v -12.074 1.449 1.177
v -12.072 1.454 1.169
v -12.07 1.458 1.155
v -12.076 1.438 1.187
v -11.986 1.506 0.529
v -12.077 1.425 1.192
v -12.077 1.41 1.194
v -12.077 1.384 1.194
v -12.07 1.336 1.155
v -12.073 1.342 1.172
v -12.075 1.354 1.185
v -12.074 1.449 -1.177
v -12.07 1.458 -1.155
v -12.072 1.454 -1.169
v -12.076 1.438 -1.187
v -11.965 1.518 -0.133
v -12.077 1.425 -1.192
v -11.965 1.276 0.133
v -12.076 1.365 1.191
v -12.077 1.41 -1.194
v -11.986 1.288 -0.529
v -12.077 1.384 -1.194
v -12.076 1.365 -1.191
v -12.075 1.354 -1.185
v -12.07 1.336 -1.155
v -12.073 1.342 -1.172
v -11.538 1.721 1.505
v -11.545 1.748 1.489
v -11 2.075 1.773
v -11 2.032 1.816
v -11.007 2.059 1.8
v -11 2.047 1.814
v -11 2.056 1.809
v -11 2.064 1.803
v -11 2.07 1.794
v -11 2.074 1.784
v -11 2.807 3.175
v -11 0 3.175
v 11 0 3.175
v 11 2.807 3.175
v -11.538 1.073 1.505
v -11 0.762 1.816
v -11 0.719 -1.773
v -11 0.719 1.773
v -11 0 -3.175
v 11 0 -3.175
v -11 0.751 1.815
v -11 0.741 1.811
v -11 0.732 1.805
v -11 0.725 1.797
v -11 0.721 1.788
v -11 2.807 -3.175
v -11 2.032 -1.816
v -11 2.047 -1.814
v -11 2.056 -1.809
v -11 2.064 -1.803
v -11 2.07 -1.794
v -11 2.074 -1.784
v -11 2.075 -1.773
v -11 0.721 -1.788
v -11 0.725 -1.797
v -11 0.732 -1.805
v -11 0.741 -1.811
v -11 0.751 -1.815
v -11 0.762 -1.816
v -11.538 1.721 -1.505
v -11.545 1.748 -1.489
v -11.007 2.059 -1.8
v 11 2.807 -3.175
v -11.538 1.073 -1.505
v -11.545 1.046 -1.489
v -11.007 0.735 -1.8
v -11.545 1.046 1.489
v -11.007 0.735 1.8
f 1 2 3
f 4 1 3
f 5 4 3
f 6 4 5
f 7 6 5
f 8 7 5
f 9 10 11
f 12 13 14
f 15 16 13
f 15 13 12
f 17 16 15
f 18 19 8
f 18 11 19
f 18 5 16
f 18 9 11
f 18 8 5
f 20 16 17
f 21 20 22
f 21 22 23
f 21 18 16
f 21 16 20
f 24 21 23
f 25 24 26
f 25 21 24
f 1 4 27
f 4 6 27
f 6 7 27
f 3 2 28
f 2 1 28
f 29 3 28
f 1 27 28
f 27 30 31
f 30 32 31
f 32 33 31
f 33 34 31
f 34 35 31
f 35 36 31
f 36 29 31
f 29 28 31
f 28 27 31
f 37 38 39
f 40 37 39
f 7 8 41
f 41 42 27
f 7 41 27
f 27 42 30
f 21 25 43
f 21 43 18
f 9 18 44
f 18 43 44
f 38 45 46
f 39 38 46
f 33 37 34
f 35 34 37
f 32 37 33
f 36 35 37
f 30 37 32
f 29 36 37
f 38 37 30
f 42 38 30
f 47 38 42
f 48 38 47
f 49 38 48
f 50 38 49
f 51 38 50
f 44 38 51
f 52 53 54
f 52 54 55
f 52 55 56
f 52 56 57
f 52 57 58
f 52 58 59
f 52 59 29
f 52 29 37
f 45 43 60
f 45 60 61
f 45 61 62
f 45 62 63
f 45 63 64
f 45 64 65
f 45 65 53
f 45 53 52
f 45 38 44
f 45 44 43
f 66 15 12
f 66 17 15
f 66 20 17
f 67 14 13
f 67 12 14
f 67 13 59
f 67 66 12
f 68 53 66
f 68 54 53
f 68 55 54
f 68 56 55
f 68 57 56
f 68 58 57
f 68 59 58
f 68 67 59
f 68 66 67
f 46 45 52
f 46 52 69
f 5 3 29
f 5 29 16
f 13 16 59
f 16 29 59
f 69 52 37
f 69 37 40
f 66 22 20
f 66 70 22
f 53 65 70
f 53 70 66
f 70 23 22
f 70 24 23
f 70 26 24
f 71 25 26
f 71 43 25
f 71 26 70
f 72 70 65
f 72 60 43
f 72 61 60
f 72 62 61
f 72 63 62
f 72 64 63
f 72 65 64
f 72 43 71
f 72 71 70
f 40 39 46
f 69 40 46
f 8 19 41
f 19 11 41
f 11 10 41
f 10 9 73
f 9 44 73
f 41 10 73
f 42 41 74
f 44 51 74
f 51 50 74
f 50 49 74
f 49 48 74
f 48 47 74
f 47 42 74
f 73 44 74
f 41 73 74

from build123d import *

# Parameters (mm, degrees)
CROQUIS1_W              = 22
CROQUIS1_H              = 6.35
SALIENTE_EXTRUIR1_DEPTH = 2.8067
CROQUIS2_W              = 2.5
CROQUIS2_H              = 0.224358974
SALIENTE_EXTRUIR2_DEPTH = 1.07696
SALIENTE_EXTRUIR2_TAPER = 3
REDONDEO1_R             = 0.049609375
CORTAR_EXTRUIR1_DEPTH   = 13.798873245


with BuildPart() as part:
    # Croquis1 → Saliente-Extruir1 (new body)
    with BuildSketch(Plane(origin=(0, 0, 0), x_dir=(1, 0, 0), z_dir=(0, 1, 0))):
        Rectangle(CROQUIS1_W, CROQUIS1_H)
    extrude(amount=SALIENTE_EXTRUIR1_DEPTH)

    # Croquis2 → Saliente-Extruir2 (add)
    with BuildSketch(Plane.ZY.offset(11)):
        with Locations((0, 1.397)):
            Rectangle(CROQUIS2_W, CROQUIS2_H)
    extrude(amount=SALIENTE_EXTRUIR2_DEPTH, taper=SALIENTE_EXTRUIR2_TAPER)

    # Chaflán1: read off the stored shape, not the designer's step
    # Chaflán1: loft between two sections, ruled curve by curve
    chafl_n1_from = [
        Edge.make_line((-12.07696, 1.34070485, -1.194115663), (-12.07696, 1.34070485, 1.194115663)),
        Edge.make_line((-12.07696, 1.34070485, 1.194115663), (-12.07696, 1.45329515, 1.194115663)),
        Edge.make_line((-12.07696, 1.34070485, -1.194115663), (-12.07696, 1.45329515, -1.194115663)),
        Edge.make_line((-12.07696, 1.45329515, 1.194115663), (-12.07696, 1.45329515, -1.194115663)),
    ]
    chafl_n1_to = [
        Edge.make_line((-11, 0.718921704, -1.815898809), (-11, 0.718921704, 1.815898809)),
        Edge.make_line((-11, 0.718921704, 1.815898809), (-11, 2.075078296, 1.815898809)),
        Edge.make_line((-11, 0.718921704, -1.815898809), (-11, 2.075078296, -1.815898809)),
        Edge.make_line((-11, 2.075078296, 1.815898809), (-11, 2.075078296, -1.815898809)),
    ]
    chafl_n1 = Solid(Shell([*[Face.make_surface_from_curves(chafl_n1_from[k], chafl_n1_to[k]) for k in range(4)], Face(Wire(chafl_n1_from)), Face(Wire(chafl_n1_to))]))
    add(chafl_n1)

    # Redondeo1
    redondeo1_edges = [part.edges().sort_by_distance(p)[0] for p in [
        (-11.53848, 1.029813277, 1.505007236),
        (-11.53848, 1.029813277, -1.505007236),
        (-11.53848, 1.764186723, 1.505007236),
        (-11.53848, 1.764186723, -1.505007236),
    ]]
    fillet(redondeo1_edges, radius=REDONDEO1_R)

    # Croquis4 → Cortar-Extruir1 (cut, through all)
    with BuildSketch(Plane.XZ):
        with BuildLine():
            Line((-12.07696, -1.194115663), (-12.07696, 1.194115663))
            ThreePointArc((-12.07696, 1.194115663), (-11.963672899, 0), (-12.07696, -1.194115663))
        make_face()
    extrude(amount=-CORTAR_EXTRUIR1_DEPTH, mode=Mode.SUBTRACT)


solid = part.part
